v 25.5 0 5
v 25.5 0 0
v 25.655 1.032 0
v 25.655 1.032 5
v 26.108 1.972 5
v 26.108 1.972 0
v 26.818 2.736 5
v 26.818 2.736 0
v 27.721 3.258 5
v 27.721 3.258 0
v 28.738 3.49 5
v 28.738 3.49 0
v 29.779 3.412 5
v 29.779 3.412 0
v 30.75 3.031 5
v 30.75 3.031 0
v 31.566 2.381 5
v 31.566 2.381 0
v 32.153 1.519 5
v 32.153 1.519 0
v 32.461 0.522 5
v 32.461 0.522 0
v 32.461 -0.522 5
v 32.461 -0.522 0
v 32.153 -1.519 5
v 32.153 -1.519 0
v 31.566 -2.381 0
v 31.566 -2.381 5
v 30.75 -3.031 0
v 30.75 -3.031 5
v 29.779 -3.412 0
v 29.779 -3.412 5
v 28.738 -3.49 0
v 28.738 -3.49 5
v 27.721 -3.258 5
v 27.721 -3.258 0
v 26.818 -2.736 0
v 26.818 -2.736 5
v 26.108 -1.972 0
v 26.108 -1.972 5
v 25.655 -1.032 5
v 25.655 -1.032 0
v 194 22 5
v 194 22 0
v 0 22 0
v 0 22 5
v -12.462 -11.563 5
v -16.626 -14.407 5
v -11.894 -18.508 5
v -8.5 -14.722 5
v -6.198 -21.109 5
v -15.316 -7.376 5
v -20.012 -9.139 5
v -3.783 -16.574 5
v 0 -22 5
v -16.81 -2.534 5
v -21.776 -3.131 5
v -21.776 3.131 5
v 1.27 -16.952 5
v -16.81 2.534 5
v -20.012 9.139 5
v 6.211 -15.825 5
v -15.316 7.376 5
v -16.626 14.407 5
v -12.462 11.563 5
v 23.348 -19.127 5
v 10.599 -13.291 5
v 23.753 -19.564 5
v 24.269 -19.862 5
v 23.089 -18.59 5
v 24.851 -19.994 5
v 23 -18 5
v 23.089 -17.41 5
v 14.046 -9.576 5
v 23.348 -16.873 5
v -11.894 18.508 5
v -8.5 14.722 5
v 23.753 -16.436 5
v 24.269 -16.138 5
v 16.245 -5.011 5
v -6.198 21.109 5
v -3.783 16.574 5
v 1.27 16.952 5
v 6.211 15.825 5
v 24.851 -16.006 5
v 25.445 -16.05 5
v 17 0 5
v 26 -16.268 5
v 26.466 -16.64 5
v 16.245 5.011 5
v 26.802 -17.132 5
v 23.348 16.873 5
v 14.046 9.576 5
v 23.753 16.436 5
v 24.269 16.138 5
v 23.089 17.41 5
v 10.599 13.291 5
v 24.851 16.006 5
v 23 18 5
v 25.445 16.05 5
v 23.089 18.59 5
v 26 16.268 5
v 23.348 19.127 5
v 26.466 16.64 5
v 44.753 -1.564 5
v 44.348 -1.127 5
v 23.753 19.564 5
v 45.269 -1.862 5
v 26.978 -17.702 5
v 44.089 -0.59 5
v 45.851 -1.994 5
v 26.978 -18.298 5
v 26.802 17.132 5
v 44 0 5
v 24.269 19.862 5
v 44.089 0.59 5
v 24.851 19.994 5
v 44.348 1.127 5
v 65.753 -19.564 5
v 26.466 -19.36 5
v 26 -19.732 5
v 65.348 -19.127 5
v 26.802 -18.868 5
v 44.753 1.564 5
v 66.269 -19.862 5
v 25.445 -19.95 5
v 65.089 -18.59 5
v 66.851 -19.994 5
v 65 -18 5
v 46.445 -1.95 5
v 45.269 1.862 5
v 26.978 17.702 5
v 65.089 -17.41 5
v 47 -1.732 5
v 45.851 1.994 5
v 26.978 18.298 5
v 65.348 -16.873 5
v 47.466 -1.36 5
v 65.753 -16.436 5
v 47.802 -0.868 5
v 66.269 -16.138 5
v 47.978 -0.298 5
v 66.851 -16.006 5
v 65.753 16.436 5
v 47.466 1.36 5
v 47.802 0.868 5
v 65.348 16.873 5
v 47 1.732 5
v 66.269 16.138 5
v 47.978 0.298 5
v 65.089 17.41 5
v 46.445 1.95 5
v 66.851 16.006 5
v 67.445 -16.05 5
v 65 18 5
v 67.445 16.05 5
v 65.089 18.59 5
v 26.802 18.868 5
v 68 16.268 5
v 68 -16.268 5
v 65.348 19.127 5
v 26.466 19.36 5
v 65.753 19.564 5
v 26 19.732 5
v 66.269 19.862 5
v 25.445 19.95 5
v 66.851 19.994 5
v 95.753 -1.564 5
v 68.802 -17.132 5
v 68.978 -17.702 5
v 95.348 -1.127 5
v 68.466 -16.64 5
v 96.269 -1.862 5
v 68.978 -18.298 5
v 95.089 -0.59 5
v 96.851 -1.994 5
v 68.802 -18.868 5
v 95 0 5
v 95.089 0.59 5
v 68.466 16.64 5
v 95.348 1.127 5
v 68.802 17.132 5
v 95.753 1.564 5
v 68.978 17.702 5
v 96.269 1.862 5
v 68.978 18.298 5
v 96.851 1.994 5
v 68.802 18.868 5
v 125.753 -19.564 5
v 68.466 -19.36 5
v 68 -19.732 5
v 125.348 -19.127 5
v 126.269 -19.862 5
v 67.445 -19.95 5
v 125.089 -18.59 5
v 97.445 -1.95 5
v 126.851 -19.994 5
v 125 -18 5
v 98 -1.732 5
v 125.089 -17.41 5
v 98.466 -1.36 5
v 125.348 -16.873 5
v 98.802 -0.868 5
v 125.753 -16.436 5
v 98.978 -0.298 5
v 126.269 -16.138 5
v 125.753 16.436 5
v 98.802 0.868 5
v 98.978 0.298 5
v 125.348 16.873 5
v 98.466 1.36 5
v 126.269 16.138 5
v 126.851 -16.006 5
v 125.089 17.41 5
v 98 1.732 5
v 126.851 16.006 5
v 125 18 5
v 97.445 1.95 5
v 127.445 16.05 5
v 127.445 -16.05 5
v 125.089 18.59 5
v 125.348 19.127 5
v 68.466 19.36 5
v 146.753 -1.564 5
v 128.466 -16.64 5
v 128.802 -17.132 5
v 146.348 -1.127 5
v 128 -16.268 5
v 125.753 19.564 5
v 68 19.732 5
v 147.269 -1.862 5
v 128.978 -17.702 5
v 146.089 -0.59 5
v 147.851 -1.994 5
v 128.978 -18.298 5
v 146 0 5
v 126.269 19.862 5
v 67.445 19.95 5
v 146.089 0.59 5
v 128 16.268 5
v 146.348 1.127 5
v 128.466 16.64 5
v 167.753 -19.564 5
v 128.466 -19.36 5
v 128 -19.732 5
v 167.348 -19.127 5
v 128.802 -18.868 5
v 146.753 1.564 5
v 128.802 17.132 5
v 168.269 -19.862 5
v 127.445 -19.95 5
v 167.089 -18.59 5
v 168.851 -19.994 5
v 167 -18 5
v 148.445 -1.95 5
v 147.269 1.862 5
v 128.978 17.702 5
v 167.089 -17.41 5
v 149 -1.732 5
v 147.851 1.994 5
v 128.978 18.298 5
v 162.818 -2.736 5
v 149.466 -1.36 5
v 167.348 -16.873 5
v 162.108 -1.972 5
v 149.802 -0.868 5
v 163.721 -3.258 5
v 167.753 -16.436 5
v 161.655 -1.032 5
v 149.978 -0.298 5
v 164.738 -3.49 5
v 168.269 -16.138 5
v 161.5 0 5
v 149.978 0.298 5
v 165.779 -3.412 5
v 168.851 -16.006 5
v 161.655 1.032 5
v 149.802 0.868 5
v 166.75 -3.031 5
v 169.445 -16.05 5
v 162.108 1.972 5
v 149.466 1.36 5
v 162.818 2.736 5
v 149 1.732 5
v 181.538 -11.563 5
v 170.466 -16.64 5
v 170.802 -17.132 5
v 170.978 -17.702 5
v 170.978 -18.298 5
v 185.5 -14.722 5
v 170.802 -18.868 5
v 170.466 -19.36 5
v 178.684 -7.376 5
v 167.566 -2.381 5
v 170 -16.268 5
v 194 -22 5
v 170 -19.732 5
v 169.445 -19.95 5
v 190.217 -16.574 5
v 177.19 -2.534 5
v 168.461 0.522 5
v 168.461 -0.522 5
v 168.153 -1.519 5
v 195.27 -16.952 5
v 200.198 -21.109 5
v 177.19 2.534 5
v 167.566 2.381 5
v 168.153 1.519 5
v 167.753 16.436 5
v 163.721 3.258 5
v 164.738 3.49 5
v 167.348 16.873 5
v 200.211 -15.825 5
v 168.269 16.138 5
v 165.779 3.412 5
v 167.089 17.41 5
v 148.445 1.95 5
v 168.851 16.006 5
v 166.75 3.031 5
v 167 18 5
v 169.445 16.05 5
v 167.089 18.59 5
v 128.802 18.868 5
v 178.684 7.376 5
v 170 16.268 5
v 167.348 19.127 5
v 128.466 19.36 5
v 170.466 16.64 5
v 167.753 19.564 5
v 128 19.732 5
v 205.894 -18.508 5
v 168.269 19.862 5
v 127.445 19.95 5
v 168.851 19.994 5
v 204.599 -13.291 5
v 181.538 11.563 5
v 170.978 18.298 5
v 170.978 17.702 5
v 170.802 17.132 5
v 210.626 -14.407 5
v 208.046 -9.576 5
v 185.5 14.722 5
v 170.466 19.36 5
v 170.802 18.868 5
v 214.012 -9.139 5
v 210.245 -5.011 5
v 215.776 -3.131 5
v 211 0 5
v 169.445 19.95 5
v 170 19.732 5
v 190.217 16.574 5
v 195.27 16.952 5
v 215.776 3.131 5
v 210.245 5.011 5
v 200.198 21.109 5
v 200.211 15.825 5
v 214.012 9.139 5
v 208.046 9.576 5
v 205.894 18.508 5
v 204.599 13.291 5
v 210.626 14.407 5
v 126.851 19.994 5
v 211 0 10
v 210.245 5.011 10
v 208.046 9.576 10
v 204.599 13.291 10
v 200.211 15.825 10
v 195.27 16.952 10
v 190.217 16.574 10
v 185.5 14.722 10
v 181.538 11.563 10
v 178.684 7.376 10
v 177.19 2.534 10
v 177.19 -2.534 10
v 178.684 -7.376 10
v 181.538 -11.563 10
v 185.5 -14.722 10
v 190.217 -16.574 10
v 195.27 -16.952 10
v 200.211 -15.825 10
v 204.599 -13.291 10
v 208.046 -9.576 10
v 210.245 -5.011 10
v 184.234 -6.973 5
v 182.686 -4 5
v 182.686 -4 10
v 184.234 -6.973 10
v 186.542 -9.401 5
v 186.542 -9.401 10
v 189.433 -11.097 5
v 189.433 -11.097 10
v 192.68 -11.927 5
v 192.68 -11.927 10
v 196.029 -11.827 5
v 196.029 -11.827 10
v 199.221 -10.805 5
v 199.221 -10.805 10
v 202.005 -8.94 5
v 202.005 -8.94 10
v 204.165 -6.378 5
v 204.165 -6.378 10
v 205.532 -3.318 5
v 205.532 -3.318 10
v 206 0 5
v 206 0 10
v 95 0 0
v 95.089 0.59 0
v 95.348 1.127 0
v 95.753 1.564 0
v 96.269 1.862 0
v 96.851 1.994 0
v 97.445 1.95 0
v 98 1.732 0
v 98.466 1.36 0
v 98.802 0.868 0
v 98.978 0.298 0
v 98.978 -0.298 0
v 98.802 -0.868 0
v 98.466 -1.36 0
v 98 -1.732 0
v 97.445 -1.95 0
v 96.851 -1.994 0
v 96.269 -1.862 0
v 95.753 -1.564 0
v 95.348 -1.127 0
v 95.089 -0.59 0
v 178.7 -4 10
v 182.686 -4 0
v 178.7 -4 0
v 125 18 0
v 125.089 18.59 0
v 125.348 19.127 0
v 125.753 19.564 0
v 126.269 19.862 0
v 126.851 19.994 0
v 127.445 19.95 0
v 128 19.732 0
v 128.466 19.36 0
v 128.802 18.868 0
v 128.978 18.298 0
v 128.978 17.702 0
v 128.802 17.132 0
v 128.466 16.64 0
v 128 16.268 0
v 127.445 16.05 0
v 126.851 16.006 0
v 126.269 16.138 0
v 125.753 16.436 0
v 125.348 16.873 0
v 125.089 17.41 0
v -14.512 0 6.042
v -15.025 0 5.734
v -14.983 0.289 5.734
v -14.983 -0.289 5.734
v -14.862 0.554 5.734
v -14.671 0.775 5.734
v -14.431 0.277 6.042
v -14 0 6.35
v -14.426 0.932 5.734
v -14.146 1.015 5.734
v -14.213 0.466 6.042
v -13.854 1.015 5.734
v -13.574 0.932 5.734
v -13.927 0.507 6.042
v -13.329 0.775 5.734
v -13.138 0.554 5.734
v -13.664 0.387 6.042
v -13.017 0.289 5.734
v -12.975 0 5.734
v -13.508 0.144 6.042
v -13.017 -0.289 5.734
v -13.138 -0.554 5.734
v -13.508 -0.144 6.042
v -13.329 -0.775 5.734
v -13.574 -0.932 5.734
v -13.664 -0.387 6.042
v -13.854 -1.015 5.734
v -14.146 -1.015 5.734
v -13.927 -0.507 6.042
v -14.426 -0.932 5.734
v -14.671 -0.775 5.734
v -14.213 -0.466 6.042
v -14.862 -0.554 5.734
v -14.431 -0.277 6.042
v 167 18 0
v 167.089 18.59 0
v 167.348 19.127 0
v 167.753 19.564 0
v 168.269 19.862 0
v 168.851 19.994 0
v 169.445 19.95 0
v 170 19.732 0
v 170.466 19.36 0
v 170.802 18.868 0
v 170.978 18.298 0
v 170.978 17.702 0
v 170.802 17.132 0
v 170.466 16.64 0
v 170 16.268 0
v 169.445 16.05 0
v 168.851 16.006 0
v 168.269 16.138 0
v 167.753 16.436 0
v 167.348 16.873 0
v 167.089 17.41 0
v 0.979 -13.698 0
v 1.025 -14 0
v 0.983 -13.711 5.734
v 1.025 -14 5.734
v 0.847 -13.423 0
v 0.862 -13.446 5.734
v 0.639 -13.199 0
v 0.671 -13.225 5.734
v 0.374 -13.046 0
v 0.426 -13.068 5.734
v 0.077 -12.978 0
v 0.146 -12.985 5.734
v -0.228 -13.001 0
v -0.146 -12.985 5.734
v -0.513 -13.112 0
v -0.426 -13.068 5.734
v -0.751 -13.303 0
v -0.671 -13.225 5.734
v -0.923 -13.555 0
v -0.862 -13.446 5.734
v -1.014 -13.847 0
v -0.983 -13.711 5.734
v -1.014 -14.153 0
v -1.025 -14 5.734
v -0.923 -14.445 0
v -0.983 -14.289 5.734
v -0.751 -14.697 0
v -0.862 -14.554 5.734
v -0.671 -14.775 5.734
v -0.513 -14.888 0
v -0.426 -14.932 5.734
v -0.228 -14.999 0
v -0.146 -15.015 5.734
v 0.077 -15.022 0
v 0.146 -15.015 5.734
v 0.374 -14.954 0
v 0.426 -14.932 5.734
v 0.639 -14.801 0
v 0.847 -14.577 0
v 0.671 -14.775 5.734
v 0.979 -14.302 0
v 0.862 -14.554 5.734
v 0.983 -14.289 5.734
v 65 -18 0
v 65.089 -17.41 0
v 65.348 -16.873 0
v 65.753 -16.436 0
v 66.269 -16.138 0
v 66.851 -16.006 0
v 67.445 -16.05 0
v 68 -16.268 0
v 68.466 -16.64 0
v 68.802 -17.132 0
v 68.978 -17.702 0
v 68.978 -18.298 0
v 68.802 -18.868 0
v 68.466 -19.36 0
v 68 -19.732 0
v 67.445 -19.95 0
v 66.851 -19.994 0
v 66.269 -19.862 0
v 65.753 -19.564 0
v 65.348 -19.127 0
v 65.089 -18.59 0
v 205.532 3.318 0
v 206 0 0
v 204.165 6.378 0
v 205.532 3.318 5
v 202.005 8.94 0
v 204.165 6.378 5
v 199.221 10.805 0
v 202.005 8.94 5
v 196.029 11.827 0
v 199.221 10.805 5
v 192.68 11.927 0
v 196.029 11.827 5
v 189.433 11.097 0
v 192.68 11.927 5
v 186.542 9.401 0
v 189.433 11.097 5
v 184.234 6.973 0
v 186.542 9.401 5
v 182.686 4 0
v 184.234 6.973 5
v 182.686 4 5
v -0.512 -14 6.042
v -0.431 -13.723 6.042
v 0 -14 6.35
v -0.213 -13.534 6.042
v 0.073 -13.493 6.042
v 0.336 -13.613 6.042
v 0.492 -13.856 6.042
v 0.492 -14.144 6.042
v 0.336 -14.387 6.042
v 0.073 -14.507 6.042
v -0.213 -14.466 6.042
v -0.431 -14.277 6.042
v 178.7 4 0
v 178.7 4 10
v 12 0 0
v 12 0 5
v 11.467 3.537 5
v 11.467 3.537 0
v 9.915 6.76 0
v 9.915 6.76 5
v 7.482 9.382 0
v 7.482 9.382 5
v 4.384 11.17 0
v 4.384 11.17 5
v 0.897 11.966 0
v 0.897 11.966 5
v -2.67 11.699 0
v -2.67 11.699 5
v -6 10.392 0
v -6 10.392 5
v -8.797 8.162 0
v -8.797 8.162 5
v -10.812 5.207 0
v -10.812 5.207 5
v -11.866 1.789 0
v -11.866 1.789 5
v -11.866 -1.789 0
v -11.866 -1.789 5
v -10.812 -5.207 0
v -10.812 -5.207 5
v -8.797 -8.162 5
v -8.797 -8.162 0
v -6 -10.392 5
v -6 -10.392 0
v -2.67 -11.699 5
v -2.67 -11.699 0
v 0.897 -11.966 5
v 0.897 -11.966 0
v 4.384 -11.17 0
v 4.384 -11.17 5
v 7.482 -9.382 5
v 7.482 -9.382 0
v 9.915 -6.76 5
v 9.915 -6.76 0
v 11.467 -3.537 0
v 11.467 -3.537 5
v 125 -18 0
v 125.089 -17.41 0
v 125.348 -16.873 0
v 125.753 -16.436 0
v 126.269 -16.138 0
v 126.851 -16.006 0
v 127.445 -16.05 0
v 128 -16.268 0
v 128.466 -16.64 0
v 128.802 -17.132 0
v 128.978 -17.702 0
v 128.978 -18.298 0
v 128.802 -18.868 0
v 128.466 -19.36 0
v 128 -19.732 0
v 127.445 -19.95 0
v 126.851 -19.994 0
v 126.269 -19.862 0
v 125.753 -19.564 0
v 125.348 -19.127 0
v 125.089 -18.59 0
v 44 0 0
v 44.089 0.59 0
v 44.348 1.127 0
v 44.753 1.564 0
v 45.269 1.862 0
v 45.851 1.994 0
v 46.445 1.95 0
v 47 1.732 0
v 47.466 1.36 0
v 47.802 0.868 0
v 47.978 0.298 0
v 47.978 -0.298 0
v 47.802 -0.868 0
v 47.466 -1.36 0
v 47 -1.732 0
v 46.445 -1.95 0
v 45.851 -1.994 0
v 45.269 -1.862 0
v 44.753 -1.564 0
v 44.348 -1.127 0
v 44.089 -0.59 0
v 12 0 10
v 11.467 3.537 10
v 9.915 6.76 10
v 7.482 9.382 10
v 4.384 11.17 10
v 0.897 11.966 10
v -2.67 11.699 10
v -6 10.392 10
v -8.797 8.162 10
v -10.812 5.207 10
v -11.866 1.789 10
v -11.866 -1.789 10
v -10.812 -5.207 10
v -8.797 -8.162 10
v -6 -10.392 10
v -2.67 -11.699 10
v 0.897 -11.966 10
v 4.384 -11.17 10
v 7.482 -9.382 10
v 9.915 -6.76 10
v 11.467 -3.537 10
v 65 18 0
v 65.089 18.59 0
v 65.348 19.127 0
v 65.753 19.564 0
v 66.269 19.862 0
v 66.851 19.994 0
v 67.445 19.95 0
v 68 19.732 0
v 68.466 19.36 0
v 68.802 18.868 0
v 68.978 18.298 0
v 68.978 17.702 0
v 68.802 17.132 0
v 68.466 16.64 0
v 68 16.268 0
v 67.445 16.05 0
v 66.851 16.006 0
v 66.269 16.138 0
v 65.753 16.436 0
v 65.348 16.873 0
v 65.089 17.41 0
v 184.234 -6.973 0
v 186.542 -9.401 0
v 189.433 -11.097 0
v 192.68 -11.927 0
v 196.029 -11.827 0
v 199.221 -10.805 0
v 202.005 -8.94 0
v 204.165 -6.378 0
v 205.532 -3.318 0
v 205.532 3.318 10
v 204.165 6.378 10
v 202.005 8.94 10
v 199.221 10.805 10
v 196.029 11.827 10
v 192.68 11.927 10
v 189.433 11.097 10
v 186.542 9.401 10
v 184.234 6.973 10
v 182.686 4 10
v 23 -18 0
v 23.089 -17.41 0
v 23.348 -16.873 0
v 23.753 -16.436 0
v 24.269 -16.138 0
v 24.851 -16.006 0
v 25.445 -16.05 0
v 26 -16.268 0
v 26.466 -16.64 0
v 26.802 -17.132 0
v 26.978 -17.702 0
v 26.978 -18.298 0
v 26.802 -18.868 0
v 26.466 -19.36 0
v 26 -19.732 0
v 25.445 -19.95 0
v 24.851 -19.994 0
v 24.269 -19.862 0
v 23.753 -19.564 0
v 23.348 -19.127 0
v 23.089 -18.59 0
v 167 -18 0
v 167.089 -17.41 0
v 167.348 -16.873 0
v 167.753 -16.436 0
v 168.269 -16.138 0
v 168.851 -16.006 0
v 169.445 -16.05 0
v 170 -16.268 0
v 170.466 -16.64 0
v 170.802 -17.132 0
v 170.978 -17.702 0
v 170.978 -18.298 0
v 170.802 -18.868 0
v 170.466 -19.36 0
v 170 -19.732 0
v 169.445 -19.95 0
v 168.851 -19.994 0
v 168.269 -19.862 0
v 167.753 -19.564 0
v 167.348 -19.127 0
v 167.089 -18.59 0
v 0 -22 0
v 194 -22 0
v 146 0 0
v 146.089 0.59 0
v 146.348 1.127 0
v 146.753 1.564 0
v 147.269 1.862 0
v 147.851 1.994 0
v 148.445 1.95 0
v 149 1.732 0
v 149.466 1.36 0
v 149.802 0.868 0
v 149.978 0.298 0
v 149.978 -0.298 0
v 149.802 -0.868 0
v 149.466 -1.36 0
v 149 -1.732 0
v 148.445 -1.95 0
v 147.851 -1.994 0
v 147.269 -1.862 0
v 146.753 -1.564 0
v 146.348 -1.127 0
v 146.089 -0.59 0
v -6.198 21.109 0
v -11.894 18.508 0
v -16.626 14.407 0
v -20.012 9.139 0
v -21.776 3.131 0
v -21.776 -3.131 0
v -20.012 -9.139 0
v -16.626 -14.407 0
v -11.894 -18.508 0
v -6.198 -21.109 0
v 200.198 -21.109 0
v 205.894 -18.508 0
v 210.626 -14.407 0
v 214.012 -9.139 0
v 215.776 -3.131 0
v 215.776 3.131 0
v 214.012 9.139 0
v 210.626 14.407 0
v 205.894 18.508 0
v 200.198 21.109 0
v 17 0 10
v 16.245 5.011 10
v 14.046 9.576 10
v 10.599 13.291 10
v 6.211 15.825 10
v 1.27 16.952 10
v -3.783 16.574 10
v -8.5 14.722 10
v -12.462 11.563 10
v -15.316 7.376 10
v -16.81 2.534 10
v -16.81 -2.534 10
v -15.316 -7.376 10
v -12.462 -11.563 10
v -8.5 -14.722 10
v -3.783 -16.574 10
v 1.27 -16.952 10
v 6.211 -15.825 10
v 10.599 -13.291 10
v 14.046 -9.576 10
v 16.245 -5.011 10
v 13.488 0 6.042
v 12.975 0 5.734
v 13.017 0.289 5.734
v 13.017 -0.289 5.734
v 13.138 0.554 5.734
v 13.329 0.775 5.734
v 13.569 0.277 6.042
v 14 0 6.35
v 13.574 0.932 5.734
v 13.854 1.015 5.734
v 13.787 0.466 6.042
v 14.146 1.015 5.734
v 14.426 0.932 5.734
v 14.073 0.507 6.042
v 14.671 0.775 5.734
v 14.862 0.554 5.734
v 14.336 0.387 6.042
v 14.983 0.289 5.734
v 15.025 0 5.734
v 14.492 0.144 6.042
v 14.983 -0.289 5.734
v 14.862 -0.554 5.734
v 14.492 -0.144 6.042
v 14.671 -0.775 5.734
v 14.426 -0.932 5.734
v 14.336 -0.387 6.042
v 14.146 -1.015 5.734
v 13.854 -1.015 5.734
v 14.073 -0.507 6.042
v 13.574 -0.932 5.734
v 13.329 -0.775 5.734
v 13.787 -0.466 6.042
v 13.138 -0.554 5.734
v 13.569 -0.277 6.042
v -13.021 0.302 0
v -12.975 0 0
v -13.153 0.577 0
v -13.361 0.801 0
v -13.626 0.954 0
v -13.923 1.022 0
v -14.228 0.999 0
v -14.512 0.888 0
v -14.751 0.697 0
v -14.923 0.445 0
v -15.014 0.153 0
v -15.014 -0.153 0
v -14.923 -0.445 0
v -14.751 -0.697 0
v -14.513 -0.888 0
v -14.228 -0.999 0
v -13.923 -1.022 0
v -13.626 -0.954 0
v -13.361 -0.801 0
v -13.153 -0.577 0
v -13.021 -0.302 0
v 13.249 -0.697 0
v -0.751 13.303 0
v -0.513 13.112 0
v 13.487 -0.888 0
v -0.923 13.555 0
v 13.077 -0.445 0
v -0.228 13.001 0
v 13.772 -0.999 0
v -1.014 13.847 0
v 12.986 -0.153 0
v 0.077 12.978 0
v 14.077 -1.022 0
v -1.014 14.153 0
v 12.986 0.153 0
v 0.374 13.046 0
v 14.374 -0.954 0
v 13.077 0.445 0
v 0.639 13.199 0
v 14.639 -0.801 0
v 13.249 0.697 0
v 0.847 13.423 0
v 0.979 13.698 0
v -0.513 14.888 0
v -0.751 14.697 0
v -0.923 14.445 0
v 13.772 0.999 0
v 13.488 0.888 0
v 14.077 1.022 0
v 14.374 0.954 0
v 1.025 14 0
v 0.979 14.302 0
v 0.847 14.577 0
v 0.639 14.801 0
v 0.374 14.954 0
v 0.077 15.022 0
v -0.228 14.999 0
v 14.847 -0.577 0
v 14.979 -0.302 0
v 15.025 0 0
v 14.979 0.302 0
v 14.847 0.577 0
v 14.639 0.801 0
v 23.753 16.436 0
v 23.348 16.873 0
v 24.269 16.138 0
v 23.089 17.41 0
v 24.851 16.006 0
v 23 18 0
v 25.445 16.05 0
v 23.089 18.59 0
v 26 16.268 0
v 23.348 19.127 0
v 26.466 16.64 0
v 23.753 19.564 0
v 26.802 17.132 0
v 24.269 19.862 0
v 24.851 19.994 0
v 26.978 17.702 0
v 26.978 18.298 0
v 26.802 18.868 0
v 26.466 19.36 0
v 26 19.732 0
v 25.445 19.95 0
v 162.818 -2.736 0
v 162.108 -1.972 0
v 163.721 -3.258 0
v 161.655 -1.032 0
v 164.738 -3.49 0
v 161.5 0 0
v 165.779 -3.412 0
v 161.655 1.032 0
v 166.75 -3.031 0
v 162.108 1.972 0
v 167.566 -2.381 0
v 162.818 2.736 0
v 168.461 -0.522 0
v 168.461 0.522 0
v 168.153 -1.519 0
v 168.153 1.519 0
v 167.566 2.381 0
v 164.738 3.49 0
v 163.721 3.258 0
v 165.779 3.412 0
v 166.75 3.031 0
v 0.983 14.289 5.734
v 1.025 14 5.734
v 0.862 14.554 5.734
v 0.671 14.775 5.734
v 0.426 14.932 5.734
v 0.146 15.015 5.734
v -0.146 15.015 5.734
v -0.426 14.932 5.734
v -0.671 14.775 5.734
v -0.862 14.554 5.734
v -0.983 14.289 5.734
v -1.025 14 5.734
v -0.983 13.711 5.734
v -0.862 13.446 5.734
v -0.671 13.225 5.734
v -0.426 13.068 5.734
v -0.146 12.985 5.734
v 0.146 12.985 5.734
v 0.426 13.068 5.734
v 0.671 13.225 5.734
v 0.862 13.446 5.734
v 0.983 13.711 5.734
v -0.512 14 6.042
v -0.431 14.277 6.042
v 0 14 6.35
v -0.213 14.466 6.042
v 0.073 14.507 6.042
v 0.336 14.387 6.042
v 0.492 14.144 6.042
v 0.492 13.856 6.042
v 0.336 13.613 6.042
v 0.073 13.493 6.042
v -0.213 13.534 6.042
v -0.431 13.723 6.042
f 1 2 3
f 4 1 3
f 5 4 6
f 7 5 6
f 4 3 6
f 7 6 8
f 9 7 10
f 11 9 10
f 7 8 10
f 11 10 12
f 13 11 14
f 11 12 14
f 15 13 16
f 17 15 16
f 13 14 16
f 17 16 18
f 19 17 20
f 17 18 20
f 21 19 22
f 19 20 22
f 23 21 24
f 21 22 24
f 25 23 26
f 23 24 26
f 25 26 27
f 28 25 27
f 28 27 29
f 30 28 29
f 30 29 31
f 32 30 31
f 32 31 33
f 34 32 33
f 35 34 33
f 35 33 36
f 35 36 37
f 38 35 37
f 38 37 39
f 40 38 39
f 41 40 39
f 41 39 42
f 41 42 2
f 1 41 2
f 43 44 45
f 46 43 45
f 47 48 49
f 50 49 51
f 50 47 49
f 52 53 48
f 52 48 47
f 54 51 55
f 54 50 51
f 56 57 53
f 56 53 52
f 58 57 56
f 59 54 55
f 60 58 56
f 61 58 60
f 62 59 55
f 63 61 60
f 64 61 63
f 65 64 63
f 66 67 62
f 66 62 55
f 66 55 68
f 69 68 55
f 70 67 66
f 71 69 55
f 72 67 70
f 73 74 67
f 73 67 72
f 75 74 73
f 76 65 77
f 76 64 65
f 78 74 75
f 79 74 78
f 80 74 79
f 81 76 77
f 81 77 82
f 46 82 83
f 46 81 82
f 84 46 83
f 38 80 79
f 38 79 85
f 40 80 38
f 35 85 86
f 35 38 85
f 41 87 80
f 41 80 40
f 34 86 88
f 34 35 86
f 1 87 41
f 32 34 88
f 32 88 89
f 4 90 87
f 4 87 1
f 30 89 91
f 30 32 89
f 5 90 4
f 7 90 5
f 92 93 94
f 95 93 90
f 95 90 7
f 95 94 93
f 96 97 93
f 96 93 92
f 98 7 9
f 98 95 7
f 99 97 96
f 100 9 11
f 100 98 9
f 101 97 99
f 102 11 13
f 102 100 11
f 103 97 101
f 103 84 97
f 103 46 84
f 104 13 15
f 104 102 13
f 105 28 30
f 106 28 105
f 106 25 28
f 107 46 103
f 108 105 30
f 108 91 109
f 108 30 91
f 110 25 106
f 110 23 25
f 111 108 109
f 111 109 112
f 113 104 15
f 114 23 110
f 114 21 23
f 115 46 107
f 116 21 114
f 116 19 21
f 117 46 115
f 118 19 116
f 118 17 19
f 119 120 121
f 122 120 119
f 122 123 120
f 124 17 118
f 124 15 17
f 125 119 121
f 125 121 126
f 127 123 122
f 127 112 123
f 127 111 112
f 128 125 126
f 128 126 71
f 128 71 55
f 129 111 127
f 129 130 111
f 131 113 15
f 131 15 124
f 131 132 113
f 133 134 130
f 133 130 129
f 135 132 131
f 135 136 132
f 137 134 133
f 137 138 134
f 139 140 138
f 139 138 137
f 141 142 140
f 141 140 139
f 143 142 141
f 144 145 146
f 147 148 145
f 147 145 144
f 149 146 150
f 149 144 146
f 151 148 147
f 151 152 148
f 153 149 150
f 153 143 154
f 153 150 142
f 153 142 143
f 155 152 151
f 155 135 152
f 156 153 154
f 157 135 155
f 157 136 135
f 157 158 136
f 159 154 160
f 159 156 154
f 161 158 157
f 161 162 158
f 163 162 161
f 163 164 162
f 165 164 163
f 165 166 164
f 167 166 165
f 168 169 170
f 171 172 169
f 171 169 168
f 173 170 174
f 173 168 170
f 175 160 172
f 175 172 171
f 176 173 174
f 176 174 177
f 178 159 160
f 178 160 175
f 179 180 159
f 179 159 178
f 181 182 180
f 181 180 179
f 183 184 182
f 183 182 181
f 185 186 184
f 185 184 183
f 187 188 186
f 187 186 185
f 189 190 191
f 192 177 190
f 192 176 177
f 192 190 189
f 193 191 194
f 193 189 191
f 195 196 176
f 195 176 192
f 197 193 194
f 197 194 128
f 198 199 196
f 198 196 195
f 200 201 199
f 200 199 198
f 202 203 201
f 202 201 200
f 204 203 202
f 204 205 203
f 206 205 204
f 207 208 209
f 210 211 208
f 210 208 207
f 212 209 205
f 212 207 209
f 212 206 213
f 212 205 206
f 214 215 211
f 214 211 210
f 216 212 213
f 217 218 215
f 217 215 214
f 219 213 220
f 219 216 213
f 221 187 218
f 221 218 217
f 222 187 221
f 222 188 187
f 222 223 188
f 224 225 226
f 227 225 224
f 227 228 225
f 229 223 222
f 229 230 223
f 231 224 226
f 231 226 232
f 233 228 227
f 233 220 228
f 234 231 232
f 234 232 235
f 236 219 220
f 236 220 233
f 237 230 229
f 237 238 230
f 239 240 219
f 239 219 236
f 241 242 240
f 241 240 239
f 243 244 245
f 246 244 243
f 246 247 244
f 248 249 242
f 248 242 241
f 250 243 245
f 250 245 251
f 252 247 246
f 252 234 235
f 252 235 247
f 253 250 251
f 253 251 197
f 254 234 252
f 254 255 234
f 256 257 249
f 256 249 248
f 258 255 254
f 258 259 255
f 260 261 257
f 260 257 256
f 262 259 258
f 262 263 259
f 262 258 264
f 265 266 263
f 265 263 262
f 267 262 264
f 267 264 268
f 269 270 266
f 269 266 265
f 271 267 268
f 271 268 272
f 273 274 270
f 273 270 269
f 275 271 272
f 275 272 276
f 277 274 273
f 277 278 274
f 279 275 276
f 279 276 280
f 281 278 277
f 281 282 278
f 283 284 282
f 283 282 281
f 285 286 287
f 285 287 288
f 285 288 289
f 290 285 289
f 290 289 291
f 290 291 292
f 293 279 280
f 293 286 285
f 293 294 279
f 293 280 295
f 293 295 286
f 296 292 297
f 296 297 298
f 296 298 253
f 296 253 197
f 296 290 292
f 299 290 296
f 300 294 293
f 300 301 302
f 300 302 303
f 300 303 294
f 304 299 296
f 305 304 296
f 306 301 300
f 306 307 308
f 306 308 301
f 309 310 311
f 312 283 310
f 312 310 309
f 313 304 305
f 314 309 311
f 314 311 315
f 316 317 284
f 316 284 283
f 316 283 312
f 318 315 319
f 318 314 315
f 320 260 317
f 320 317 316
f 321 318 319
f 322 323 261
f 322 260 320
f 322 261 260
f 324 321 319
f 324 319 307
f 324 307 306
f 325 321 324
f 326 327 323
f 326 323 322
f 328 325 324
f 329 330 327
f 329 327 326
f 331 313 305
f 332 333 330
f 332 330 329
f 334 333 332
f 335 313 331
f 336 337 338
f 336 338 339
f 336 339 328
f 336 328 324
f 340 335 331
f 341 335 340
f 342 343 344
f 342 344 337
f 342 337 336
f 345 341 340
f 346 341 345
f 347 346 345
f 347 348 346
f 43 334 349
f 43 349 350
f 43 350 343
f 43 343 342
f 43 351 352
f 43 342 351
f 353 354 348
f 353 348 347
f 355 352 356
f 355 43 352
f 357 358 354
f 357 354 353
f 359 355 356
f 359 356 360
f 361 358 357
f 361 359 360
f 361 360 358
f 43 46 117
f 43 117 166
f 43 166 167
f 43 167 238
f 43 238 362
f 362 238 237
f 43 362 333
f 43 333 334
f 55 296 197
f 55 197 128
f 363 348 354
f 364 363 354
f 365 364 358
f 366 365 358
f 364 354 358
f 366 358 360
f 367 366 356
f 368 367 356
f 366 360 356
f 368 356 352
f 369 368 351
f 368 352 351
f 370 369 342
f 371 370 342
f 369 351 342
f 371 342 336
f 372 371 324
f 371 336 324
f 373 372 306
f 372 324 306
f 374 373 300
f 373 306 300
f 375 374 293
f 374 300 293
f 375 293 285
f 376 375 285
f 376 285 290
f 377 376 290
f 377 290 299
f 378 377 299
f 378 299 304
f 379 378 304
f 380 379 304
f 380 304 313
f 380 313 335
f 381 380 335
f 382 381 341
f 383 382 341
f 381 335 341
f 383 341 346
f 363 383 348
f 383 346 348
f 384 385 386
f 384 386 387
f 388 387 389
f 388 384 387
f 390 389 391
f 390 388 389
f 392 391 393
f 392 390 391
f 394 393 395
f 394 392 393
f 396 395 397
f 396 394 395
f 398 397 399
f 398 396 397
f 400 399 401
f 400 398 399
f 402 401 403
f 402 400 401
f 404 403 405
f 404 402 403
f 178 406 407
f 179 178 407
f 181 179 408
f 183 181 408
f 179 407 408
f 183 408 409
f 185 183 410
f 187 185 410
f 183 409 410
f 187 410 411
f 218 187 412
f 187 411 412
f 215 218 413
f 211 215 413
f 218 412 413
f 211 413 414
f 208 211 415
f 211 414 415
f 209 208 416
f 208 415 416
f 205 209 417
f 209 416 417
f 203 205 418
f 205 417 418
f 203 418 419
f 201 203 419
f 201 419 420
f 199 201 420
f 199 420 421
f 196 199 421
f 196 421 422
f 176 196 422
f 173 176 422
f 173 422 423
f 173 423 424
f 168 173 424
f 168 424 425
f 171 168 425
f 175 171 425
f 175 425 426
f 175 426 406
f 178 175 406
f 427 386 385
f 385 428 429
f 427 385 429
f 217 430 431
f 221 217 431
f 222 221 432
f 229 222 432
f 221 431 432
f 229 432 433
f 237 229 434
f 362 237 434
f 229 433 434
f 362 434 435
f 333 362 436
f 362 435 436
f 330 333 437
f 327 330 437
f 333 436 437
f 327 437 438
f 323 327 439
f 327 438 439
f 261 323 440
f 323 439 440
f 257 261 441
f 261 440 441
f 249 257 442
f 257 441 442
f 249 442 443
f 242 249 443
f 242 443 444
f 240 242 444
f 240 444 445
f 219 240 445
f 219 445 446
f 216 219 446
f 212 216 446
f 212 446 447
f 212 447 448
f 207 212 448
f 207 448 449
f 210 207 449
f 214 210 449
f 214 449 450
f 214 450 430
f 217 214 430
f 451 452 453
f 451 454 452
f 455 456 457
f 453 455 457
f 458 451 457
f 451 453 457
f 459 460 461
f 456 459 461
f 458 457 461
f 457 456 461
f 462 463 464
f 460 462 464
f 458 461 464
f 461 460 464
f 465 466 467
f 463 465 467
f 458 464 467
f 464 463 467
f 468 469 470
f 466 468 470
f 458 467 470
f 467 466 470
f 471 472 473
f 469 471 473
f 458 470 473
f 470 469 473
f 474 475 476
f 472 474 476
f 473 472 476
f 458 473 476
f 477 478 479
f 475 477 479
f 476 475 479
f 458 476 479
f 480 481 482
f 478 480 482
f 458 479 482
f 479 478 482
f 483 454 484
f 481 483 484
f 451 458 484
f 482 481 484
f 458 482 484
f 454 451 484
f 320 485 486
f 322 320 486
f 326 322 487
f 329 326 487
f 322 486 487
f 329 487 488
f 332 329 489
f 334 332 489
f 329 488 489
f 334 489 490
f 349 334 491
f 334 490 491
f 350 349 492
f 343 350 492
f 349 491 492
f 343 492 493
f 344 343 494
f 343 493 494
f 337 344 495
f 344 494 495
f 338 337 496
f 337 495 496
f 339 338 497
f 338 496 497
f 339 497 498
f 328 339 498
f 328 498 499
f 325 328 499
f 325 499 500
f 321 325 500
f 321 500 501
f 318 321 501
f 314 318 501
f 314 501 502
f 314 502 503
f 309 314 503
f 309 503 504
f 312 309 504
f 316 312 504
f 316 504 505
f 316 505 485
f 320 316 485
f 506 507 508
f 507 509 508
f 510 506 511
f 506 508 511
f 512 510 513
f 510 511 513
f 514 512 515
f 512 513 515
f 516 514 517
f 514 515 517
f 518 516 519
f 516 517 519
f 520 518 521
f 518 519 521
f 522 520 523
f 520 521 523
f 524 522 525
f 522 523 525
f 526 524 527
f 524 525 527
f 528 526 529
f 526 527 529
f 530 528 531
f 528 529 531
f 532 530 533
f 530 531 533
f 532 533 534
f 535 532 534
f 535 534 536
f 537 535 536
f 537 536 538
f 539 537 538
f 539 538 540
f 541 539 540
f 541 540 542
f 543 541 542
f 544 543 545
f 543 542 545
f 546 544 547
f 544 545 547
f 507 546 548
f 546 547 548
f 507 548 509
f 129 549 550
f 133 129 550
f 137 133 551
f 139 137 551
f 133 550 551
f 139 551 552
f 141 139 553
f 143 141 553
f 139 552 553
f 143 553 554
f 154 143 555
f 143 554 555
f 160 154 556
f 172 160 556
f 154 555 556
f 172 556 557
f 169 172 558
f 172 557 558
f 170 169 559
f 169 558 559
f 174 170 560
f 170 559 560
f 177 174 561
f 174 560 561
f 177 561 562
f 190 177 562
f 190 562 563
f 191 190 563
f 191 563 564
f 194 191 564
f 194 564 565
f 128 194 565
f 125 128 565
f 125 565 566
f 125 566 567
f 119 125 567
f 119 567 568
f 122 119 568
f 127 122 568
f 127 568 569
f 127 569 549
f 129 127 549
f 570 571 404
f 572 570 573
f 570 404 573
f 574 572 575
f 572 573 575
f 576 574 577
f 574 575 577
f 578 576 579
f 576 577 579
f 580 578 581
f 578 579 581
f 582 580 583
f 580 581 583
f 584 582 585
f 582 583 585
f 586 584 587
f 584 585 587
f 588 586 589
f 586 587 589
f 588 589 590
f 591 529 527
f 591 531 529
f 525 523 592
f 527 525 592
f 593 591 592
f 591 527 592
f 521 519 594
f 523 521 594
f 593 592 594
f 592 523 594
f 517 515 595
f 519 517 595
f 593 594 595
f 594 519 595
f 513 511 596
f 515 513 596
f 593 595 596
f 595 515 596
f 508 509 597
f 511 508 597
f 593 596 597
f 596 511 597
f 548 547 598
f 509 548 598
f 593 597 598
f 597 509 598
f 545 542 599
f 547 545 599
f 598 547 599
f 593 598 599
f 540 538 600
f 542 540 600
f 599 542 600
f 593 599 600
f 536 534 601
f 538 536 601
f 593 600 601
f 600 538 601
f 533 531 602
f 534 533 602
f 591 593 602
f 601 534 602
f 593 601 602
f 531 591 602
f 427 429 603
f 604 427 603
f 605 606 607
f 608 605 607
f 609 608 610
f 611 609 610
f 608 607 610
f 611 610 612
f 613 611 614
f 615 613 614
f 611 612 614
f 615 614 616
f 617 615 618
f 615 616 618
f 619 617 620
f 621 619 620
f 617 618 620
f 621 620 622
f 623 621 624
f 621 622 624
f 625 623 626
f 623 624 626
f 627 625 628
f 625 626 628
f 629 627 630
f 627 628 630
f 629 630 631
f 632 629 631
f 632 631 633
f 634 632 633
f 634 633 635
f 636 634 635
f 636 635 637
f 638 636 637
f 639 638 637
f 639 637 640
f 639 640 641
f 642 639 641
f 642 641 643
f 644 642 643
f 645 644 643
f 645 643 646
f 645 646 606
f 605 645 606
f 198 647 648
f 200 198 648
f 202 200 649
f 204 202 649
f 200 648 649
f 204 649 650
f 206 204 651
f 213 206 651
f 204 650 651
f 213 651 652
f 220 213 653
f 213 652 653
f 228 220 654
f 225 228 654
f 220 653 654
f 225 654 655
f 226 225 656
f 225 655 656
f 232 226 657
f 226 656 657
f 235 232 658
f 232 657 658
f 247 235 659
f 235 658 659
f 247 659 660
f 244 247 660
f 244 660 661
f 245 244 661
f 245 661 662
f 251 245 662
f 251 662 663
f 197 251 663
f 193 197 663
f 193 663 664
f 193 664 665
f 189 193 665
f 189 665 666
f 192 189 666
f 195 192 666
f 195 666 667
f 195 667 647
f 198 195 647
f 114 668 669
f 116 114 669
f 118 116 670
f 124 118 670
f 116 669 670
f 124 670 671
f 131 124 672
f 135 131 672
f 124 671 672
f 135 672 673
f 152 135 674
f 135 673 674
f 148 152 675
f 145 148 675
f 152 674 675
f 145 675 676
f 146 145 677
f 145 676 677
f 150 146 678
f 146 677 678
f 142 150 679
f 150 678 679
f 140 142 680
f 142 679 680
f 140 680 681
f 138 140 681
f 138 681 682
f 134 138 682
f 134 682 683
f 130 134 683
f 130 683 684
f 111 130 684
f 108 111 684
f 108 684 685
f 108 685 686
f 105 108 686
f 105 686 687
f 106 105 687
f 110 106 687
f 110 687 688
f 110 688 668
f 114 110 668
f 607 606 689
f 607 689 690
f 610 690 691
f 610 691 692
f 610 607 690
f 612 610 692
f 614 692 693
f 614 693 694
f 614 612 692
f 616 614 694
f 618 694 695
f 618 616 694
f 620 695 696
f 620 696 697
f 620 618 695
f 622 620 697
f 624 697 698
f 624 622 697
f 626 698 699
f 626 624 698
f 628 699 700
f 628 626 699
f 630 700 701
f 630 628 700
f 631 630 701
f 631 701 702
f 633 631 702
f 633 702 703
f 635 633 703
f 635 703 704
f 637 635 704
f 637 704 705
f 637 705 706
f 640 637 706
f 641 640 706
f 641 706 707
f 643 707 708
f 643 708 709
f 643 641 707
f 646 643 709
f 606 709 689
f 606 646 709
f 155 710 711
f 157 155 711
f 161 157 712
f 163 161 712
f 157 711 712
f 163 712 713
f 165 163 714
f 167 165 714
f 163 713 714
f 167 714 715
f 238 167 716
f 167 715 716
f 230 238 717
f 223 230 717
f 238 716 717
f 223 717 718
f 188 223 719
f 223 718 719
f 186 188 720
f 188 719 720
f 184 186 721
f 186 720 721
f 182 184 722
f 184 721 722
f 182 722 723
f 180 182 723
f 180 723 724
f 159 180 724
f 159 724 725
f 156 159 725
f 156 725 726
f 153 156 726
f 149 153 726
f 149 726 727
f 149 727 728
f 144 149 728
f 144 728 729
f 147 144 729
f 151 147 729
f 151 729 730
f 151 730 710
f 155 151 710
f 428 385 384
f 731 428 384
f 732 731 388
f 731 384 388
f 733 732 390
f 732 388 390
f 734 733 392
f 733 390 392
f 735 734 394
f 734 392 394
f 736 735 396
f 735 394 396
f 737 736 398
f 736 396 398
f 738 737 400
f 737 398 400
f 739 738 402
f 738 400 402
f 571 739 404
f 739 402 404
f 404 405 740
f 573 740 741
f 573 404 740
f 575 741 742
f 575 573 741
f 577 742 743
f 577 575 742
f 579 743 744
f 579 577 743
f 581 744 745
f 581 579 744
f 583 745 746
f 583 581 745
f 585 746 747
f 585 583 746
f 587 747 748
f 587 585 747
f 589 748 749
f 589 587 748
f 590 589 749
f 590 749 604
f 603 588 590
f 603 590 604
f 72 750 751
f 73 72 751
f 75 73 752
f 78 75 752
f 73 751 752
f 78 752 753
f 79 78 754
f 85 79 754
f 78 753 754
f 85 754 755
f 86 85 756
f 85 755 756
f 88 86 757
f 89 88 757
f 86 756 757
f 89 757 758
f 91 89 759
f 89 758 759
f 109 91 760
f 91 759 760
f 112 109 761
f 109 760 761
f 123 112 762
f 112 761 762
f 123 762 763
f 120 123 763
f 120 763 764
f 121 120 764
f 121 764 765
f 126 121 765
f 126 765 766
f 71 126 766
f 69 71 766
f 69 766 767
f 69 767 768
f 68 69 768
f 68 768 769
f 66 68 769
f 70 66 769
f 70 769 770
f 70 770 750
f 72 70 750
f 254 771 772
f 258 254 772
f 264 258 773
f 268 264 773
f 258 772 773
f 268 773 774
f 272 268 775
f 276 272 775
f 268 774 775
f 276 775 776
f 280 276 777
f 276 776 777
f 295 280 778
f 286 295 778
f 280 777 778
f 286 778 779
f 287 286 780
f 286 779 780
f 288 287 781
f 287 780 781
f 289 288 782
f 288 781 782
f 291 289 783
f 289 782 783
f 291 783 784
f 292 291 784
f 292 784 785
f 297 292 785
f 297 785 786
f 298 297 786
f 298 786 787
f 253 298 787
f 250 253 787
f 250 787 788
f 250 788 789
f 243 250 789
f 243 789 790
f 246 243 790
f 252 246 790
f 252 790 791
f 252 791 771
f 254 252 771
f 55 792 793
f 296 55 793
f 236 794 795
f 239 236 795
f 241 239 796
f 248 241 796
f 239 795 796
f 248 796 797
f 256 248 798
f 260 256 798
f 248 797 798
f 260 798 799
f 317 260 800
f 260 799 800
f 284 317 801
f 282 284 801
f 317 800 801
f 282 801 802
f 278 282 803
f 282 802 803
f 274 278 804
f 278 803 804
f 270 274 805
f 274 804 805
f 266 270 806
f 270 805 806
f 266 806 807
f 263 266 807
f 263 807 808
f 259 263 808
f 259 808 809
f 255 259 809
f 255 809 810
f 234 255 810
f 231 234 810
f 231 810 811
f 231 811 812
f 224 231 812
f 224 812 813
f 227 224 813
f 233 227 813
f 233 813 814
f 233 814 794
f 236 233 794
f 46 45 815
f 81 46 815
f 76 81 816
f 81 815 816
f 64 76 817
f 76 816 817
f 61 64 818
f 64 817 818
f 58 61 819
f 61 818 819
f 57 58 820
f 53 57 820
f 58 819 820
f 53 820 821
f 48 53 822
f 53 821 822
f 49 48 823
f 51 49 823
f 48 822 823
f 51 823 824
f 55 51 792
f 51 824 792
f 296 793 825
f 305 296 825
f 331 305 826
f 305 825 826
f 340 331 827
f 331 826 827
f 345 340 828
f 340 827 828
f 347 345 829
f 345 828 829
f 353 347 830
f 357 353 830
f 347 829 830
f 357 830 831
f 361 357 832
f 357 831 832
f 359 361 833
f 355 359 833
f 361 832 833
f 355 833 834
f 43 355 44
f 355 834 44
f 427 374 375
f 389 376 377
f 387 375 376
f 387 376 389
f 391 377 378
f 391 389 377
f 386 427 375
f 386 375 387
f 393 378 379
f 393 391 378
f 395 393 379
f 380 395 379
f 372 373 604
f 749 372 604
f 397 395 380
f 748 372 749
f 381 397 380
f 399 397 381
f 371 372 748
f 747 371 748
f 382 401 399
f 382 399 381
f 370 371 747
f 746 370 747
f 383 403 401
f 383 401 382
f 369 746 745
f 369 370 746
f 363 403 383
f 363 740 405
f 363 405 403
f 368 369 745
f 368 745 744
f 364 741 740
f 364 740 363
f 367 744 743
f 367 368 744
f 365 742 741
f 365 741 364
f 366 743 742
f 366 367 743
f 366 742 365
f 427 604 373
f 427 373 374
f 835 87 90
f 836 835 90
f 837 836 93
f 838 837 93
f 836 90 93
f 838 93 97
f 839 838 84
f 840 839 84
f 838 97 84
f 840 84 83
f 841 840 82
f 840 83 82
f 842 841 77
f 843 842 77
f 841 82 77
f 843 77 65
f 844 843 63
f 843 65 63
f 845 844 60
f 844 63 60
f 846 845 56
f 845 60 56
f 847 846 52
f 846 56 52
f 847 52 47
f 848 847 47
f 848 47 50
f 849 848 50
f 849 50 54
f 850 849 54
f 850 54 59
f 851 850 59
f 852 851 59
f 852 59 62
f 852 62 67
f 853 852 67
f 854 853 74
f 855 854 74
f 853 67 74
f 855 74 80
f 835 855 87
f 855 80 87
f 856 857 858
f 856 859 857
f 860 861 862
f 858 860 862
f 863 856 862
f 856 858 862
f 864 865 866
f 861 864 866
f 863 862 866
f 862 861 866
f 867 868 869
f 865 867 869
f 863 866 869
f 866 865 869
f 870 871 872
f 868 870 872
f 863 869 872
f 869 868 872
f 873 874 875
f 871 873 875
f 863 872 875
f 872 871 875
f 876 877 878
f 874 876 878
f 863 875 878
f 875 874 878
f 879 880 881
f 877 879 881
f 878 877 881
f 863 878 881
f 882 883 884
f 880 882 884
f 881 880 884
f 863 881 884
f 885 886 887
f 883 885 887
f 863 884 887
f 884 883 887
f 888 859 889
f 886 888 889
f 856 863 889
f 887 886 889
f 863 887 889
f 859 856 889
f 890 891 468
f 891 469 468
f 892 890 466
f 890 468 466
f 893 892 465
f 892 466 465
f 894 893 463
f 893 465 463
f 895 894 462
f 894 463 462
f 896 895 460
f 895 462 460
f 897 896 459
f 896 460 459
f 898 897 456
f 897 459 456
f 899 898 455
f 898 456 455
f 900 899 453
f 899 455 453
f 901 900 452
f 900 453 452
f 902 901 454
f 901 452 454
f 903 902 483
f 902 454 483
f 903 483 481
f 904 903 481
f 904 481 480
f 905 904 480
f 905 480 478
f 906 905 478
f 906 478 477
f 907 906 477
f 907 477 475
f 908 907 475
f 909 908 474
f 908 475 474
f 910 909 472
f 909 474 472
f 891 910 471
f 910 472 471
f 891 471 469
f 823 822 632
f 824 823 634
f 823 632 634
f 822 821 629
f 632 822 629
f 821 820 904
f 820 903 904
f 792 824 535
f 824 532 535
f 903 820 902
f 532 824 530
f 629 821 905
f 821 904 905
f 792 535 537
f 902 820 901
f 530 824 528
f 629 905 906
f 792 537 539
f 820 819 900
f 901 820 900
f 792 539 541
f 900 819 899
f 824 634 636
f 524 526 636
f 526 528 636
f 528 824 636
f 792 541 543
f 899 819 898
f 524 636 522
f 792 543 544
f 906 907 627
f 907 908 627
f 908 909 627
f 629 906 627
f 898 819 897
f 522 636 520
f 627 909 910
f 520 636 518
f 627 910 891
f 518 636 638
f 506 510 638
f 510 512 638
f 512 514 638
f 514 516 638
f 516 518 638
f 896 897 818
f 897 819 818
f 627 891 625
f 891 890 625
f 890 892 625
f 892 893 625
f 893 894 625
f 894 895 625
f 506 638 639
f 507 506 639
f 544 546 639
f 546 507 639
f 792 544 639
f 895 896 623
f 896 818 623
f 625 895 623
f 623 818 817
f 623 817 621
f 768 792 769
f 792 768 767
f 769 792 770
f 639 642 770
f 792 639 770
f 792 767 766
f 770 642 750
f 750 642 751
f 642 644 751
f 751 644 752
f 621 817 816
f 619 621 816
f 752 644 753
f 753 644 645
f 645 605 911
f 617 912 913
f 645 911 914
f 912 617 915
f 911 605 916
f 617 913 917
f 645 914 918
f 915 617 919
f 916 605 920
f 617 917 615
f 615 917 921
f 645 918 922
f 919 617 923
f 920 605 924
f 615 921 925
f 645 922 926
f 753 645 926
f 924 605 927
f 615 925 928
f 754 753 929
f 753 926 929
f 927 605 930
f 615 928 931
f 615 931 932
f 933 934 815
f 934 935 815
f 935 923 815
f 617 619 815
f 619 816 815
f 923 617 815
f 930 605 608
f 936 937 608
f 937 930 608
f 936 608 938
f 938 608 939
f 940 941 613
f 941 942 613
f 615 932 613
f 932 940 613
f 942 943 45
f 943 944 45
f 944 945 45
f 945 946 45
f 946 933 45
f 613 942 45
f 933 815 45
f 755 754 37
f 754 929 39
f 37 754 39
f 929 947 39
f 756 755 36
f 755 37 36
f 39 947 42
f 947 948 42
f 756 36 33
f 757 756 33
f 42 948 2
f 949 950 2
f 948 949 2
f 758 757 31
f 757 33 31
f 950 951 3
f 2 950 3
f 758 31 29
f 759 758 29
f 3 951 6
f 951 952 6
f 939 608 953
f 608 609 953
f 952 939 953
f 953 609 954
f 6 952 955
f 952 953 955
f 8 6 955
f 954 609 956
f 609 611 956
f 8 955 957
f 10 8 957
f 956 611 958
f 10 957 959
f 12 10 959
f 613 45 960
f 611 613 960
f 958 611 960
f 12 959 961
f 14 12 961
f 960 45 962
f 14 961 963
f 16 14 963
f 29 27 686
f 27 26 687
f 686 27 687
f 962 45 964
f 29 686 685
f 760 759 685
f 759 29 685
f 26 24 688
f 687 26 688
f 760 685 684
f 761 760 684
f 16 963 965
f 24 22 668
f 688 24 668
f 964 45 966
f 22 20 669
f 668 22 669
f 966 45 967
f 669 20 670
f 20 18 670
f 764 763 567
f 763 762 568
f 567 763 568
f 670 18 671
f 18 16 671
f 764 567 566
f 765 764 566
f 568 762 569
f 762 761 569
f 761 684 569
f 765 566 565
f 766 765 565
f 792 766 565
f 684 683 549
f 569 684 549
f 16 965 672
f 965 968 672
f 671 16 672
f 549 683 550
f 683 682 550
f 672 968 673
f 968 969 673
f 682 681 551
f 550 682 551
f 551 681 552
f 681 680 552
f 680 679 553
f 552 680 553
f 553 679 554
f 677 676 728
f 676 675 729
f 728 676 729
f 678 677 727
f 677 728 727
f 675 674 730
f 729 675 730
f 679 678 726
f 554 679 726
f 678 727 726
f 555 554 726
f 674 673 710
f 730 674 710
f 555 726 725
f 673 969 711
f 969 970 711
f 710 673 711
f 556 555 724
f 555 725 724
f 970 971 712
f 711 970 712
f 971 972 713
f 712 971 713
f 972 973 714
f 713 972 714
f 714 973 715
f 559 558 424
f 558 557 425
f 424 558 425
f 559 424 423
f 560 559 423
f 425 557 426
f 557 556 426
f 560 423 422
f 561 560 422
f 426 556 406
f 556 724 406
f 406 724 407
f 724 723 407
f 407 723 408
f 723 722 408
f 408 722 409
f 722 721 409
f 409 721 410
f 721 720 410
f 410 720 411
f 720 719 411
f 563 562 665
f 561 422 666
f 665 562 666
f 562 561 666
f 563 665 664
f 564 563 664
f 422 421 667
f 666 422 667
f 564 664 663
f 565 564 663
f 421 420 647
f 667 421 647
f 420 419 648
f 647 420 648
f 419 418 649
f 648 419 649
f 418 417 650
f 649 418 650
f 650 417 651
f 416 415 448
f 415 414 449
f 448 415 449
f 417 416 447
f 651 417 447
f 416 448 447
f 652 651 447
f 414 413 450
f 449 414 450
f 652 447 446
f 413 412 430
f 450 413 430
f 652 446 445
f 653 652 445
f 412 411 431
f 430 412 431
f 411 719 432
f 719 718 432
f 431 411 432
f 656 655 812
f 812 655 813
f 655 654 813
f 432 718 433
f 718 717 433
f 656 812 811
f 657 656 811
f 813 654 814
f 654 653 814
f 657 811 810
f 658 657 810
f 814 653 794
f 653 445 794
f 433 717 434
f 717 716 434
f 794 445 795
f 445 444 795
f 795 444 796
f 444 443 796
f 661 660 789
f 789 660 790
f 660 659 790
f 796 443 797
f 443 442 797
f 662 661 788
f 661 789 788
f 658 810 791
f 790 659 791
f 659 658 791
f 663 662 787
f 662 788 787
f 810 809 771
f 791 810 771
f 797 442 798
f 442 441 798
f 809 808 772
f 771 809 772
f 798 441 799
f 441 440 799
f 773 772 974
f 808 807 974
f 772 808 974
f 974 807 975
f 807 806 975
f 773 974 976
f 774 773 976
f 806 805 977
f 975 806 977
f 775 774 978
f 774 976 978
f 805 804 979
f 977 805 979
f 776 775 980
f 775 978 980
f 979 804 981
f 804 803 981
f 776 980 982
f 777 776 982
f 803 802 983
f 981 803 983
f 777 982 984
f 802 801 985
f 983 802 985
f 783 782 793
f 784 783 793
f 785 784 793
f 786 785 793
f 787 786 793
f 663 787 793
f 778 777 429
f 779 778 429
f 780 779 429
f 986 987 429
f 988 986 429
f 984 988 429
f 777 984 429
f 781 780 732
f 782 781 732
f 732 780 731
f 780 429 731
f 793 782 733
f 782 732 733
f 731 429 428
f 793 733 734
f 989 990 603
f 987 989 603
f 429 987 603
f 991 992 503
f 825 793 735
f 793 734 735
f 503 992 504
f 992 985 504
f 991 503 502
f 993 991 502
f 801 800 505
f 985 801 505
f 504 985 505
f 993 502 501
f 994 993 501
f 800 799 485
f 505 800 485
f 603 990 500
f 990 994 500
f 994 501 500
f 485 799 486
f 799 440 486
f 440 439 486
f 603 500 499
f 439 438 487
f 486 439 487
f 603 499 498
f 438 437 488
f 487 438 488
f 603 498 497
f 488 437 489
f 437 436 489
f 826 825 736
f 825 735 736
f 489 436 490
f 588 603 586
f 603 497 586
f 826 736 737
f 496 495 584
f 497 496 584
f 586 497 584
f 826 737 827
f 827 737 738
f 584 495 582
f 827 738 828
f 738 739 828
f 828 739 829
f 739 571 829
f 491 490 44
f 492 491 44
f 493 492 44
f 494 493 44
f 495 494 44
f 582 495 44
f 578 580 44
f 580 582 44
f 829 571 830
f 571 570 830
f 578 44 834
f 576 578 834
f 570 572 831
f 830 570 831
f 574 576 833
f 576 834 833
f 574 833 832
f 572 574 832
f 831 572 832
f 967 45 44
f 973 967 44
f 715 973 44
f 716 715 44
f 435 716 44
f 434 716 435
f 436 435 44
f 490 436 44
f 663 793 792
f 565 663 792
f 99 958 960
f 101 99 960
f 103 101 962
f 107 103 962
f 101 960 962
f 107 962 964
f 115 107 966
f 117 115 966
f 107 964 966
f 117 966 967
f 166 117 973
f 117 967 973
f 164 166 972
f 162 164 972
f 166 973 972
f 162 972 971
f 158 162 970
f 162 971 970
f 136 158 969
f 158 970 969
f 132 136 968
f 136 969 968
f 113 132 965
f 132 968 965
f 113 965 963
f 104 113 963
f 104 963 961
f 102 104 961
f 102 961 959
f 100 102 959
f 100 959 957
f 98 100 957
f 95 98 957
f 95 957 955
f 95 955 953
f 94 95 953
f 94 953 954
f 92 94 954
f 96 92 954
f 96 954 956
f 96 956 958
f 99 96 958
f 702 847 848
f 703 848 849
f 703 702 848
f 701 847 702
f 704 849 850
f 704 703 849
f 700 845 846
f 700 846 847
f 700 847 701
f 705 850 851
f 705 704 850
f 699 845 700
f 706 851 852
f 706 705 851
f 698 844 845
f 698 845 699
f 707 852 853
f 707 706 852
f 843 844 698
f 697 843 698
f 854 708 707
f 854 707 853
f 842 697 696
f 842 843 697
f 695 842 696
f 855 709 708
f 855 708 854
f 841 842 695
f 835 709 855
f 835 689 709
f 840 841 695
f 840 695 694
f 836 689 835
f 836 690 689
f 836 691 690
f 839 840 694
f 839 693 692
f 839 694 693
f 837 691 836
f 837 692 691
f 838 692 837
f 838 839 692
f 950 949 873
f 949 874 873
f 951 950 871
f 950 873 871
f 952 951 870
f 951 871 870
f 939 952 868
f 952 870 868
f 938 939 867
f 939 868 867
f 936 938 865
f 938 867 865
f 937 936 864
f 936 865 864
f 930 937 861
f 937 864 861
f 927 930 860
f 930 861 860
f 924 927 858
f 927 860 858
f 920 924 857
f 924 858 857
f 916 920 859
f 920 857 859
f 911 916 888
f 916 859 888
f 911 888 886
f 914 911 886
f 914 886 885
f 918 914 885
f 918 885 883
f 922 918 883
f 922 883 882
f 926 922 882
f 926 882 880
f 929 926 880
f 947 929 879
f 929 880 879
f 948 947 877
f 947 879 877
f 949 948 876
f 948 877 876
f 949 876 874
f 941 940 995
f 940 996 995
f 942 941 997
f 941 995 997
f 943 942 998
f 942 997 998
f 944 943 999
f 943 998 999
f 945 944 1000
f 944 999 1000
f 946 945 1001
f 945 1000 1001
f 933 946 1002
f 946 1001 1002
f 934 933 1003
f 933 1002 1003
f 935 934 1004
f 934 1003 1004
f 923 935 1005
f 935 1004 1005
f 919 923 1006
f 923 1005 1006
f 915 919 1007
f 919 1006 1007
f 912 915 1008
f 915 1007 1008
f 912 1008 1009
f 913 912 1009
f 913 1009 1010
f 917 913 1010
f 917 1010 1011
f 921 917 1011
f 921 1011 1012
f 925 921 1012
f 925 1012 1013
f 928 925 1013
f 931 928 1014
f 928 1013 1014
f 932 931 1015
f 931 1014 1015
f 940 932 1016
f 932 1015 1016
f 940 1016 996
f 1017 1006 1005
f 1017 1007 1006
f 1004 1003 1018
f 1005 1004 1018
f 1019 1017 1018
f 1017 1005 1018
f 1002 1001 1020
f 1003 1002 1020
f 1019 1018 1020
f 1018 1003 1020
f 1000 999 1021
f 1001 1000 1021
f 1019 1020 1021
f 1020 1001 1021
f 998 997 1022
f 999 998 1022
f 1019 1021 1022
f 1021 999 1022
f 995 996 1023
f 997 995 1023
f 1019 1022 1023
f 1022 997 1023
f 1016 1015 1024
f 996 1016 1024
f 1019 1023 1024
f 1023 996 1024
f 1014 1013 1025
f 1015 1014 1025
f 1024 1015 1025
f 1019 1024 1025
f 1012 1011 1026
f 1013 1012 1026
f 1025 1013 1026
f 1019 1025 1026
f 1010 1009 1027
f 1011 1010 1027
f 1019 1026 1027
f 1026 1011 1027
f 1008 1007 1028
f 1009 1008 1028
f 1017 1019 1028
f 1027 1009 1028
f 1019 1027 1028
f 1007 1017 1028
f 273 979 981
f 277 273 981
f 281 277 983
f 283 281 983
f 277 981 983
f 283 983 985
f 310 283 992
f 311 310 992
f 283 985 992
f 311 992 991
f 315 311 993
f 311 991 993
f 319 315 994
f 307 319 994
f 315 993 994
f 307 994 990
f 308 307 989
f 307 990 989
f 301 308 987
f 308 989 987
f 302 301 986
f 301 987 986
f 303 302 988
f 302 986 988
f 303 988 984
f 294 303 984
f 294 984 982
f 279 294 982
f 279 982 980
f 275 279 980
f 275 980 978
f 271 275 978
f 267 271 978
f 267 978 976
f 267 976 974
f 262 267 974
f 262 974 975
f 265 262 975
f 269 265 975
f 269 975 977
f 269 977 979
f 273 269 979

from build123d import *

# Parameters (mm, degrees)
BOSS_EXTRUDE1_DEPTH     = 5
SKETCH2_R               = 17
SKETCH2_R_2             = 12
BOSS_EXTRUDE2_DEPTH     = 5
SKETCH3_R               = 12
CUT_EXTRUDE1_DEPTH      = 6
SKETCH5_R               = 2
SKETCH5_R_2             = 3.5
CUT_EXTRUDE2_DEPTH      = 10
SKETCH9_W               = 4
SKETCH9_H               = 8
CUT_EXTRUDE4_DEPTH      = 10
M2_5_TAPPED_HOLE1_D     = 2.05
M2_5_TAPPED_HOLE1_DEPTH = 5.734117865
M2_5_TAPPED_HOLE1_TIP   = 0.615882135


with BuildPart() as part:
    # Sketch1 → Boss-Extrude1 (new body)
    with BuildSketch(Plane.XY):
        with BuildLine():
            Line((194, 22), (0, 22))
            ThreePointArc((0, 22), (-22, 0), (0, -22))
            Line((0, -22), (194, -22))
            ThreePointArc((194, -22), (216, 0), (194, 22))
        make_face()
    extrude(amount=BOSS_EXTRUDE1_DEPTH)

    # Sketch2 → Boss-Extrude2 (add)
    with BuildSketch(Plane.XY.offset(5)):
        Circle(SKETCH2_R)
        Circle(SKETCH2_R_2, mode=Mode.SUBTRACT)
        with Locations((194, 0)):
            Circle(SKETCH2_R)
        with Locations((194, 0)):
            Circle(SKETCH2_R_2, mode=Mode.SUBTRACT)
    extrude(amount=BOSS_EXTRUDE2_DEPTH)

    # Sketch3 → Cut-Extrude1 (cut)
    with BuildSketch(Plane.XY.offset(5)):
        with Locations((194, 0)):
            Circle(SKETCH3_R)
        Circle(SKETCH3_R)
    extrude(amount=-CUT_EXTRUDE1_DEPTH, mode=Mode.SUBTRACT)

    # Sketch5 → Cut-Extrude2 (cut)
    with BuildSketch(Plane(origin=(0, 0, 0), x_dir=(-1, 0, 0), z_dir=(0, 0, -1))):
        with Locations((-169, 18)):
            Circle(SKETCH5_R)
        with Locations((-67, 18)):
            Circle(SKETCH5_R)
        with Locations((-67, -18)):
            Circle(SKETCH5_R)
        with Locations((-169, -18)):
            Circle(SKETCH5_R)
        with Locations((-127, 18)):
            Circle(SKETCH5_R)
        with Locations((-127, -18)):
            Circle(SKETCH5_R)
        with Locations((-25, 18)):
            Circle(SKETCH5_R)
        with Locations((-25, -18)):
            Circle(SKETCH5_R)
        with Locations((-148, 0)):
            Circle(SKETCH5_R)
        with Locations((-97, 0)):
            Circle(SKETCH5_R)
        with Locations((-46, 0)):
            Circle(SKETCH5_R)
        with Locations((-165, 0)):
            Circle(SKETCH5_R_2)
        with Locations((-29, 0)):
            Circle(SKETCH5_R_2)
    extrude(amount=-CUT_EXTRUDE2_DEPTH, mode=Mode.SUBTRACT)

    # Sketch9 → Cut-Extrude4 (cut)
    with BuildSketch(Plane(origin=(0, 0, 0), x_dir=(-1, 0, 0), z_dir=(0, 0, -1))):
        with Locations((-180.7, 0)):
            Rectangle(SKETCH9_W, SKETCH9_H)
    extrude(amount=-CUT_EXTRUDE4_DEPTH, mode=Mode.SUBTRACT)

    # M2.5 Tapped Hole1
    with Locations(Plane(origin=(0, 0, 0), x_dir=(-1, 0, 0), z_dir=(0, 0, -1))):
        with Locations((0, 14), (14, 0), (0, -14), (-14, 0)):
            Hole(M2_5_TAPPED_HOLE1_D / 2, depth=M2_5_TAPPED_HOLE1_DEPTH)
            with Locations((0, 0, -(M2_5_TAPPED_HOLE1_DEPTH + M2_5_TAPPED_HOLE1_TIP / 2))):  # 118° drill point
                Cone(0, M2_5_TAPPED_HOLE1_D / 2, M2_5_TAPPED_HOLE1_TIP, mode=Mode.SUBTRACT)


solid = part.part
